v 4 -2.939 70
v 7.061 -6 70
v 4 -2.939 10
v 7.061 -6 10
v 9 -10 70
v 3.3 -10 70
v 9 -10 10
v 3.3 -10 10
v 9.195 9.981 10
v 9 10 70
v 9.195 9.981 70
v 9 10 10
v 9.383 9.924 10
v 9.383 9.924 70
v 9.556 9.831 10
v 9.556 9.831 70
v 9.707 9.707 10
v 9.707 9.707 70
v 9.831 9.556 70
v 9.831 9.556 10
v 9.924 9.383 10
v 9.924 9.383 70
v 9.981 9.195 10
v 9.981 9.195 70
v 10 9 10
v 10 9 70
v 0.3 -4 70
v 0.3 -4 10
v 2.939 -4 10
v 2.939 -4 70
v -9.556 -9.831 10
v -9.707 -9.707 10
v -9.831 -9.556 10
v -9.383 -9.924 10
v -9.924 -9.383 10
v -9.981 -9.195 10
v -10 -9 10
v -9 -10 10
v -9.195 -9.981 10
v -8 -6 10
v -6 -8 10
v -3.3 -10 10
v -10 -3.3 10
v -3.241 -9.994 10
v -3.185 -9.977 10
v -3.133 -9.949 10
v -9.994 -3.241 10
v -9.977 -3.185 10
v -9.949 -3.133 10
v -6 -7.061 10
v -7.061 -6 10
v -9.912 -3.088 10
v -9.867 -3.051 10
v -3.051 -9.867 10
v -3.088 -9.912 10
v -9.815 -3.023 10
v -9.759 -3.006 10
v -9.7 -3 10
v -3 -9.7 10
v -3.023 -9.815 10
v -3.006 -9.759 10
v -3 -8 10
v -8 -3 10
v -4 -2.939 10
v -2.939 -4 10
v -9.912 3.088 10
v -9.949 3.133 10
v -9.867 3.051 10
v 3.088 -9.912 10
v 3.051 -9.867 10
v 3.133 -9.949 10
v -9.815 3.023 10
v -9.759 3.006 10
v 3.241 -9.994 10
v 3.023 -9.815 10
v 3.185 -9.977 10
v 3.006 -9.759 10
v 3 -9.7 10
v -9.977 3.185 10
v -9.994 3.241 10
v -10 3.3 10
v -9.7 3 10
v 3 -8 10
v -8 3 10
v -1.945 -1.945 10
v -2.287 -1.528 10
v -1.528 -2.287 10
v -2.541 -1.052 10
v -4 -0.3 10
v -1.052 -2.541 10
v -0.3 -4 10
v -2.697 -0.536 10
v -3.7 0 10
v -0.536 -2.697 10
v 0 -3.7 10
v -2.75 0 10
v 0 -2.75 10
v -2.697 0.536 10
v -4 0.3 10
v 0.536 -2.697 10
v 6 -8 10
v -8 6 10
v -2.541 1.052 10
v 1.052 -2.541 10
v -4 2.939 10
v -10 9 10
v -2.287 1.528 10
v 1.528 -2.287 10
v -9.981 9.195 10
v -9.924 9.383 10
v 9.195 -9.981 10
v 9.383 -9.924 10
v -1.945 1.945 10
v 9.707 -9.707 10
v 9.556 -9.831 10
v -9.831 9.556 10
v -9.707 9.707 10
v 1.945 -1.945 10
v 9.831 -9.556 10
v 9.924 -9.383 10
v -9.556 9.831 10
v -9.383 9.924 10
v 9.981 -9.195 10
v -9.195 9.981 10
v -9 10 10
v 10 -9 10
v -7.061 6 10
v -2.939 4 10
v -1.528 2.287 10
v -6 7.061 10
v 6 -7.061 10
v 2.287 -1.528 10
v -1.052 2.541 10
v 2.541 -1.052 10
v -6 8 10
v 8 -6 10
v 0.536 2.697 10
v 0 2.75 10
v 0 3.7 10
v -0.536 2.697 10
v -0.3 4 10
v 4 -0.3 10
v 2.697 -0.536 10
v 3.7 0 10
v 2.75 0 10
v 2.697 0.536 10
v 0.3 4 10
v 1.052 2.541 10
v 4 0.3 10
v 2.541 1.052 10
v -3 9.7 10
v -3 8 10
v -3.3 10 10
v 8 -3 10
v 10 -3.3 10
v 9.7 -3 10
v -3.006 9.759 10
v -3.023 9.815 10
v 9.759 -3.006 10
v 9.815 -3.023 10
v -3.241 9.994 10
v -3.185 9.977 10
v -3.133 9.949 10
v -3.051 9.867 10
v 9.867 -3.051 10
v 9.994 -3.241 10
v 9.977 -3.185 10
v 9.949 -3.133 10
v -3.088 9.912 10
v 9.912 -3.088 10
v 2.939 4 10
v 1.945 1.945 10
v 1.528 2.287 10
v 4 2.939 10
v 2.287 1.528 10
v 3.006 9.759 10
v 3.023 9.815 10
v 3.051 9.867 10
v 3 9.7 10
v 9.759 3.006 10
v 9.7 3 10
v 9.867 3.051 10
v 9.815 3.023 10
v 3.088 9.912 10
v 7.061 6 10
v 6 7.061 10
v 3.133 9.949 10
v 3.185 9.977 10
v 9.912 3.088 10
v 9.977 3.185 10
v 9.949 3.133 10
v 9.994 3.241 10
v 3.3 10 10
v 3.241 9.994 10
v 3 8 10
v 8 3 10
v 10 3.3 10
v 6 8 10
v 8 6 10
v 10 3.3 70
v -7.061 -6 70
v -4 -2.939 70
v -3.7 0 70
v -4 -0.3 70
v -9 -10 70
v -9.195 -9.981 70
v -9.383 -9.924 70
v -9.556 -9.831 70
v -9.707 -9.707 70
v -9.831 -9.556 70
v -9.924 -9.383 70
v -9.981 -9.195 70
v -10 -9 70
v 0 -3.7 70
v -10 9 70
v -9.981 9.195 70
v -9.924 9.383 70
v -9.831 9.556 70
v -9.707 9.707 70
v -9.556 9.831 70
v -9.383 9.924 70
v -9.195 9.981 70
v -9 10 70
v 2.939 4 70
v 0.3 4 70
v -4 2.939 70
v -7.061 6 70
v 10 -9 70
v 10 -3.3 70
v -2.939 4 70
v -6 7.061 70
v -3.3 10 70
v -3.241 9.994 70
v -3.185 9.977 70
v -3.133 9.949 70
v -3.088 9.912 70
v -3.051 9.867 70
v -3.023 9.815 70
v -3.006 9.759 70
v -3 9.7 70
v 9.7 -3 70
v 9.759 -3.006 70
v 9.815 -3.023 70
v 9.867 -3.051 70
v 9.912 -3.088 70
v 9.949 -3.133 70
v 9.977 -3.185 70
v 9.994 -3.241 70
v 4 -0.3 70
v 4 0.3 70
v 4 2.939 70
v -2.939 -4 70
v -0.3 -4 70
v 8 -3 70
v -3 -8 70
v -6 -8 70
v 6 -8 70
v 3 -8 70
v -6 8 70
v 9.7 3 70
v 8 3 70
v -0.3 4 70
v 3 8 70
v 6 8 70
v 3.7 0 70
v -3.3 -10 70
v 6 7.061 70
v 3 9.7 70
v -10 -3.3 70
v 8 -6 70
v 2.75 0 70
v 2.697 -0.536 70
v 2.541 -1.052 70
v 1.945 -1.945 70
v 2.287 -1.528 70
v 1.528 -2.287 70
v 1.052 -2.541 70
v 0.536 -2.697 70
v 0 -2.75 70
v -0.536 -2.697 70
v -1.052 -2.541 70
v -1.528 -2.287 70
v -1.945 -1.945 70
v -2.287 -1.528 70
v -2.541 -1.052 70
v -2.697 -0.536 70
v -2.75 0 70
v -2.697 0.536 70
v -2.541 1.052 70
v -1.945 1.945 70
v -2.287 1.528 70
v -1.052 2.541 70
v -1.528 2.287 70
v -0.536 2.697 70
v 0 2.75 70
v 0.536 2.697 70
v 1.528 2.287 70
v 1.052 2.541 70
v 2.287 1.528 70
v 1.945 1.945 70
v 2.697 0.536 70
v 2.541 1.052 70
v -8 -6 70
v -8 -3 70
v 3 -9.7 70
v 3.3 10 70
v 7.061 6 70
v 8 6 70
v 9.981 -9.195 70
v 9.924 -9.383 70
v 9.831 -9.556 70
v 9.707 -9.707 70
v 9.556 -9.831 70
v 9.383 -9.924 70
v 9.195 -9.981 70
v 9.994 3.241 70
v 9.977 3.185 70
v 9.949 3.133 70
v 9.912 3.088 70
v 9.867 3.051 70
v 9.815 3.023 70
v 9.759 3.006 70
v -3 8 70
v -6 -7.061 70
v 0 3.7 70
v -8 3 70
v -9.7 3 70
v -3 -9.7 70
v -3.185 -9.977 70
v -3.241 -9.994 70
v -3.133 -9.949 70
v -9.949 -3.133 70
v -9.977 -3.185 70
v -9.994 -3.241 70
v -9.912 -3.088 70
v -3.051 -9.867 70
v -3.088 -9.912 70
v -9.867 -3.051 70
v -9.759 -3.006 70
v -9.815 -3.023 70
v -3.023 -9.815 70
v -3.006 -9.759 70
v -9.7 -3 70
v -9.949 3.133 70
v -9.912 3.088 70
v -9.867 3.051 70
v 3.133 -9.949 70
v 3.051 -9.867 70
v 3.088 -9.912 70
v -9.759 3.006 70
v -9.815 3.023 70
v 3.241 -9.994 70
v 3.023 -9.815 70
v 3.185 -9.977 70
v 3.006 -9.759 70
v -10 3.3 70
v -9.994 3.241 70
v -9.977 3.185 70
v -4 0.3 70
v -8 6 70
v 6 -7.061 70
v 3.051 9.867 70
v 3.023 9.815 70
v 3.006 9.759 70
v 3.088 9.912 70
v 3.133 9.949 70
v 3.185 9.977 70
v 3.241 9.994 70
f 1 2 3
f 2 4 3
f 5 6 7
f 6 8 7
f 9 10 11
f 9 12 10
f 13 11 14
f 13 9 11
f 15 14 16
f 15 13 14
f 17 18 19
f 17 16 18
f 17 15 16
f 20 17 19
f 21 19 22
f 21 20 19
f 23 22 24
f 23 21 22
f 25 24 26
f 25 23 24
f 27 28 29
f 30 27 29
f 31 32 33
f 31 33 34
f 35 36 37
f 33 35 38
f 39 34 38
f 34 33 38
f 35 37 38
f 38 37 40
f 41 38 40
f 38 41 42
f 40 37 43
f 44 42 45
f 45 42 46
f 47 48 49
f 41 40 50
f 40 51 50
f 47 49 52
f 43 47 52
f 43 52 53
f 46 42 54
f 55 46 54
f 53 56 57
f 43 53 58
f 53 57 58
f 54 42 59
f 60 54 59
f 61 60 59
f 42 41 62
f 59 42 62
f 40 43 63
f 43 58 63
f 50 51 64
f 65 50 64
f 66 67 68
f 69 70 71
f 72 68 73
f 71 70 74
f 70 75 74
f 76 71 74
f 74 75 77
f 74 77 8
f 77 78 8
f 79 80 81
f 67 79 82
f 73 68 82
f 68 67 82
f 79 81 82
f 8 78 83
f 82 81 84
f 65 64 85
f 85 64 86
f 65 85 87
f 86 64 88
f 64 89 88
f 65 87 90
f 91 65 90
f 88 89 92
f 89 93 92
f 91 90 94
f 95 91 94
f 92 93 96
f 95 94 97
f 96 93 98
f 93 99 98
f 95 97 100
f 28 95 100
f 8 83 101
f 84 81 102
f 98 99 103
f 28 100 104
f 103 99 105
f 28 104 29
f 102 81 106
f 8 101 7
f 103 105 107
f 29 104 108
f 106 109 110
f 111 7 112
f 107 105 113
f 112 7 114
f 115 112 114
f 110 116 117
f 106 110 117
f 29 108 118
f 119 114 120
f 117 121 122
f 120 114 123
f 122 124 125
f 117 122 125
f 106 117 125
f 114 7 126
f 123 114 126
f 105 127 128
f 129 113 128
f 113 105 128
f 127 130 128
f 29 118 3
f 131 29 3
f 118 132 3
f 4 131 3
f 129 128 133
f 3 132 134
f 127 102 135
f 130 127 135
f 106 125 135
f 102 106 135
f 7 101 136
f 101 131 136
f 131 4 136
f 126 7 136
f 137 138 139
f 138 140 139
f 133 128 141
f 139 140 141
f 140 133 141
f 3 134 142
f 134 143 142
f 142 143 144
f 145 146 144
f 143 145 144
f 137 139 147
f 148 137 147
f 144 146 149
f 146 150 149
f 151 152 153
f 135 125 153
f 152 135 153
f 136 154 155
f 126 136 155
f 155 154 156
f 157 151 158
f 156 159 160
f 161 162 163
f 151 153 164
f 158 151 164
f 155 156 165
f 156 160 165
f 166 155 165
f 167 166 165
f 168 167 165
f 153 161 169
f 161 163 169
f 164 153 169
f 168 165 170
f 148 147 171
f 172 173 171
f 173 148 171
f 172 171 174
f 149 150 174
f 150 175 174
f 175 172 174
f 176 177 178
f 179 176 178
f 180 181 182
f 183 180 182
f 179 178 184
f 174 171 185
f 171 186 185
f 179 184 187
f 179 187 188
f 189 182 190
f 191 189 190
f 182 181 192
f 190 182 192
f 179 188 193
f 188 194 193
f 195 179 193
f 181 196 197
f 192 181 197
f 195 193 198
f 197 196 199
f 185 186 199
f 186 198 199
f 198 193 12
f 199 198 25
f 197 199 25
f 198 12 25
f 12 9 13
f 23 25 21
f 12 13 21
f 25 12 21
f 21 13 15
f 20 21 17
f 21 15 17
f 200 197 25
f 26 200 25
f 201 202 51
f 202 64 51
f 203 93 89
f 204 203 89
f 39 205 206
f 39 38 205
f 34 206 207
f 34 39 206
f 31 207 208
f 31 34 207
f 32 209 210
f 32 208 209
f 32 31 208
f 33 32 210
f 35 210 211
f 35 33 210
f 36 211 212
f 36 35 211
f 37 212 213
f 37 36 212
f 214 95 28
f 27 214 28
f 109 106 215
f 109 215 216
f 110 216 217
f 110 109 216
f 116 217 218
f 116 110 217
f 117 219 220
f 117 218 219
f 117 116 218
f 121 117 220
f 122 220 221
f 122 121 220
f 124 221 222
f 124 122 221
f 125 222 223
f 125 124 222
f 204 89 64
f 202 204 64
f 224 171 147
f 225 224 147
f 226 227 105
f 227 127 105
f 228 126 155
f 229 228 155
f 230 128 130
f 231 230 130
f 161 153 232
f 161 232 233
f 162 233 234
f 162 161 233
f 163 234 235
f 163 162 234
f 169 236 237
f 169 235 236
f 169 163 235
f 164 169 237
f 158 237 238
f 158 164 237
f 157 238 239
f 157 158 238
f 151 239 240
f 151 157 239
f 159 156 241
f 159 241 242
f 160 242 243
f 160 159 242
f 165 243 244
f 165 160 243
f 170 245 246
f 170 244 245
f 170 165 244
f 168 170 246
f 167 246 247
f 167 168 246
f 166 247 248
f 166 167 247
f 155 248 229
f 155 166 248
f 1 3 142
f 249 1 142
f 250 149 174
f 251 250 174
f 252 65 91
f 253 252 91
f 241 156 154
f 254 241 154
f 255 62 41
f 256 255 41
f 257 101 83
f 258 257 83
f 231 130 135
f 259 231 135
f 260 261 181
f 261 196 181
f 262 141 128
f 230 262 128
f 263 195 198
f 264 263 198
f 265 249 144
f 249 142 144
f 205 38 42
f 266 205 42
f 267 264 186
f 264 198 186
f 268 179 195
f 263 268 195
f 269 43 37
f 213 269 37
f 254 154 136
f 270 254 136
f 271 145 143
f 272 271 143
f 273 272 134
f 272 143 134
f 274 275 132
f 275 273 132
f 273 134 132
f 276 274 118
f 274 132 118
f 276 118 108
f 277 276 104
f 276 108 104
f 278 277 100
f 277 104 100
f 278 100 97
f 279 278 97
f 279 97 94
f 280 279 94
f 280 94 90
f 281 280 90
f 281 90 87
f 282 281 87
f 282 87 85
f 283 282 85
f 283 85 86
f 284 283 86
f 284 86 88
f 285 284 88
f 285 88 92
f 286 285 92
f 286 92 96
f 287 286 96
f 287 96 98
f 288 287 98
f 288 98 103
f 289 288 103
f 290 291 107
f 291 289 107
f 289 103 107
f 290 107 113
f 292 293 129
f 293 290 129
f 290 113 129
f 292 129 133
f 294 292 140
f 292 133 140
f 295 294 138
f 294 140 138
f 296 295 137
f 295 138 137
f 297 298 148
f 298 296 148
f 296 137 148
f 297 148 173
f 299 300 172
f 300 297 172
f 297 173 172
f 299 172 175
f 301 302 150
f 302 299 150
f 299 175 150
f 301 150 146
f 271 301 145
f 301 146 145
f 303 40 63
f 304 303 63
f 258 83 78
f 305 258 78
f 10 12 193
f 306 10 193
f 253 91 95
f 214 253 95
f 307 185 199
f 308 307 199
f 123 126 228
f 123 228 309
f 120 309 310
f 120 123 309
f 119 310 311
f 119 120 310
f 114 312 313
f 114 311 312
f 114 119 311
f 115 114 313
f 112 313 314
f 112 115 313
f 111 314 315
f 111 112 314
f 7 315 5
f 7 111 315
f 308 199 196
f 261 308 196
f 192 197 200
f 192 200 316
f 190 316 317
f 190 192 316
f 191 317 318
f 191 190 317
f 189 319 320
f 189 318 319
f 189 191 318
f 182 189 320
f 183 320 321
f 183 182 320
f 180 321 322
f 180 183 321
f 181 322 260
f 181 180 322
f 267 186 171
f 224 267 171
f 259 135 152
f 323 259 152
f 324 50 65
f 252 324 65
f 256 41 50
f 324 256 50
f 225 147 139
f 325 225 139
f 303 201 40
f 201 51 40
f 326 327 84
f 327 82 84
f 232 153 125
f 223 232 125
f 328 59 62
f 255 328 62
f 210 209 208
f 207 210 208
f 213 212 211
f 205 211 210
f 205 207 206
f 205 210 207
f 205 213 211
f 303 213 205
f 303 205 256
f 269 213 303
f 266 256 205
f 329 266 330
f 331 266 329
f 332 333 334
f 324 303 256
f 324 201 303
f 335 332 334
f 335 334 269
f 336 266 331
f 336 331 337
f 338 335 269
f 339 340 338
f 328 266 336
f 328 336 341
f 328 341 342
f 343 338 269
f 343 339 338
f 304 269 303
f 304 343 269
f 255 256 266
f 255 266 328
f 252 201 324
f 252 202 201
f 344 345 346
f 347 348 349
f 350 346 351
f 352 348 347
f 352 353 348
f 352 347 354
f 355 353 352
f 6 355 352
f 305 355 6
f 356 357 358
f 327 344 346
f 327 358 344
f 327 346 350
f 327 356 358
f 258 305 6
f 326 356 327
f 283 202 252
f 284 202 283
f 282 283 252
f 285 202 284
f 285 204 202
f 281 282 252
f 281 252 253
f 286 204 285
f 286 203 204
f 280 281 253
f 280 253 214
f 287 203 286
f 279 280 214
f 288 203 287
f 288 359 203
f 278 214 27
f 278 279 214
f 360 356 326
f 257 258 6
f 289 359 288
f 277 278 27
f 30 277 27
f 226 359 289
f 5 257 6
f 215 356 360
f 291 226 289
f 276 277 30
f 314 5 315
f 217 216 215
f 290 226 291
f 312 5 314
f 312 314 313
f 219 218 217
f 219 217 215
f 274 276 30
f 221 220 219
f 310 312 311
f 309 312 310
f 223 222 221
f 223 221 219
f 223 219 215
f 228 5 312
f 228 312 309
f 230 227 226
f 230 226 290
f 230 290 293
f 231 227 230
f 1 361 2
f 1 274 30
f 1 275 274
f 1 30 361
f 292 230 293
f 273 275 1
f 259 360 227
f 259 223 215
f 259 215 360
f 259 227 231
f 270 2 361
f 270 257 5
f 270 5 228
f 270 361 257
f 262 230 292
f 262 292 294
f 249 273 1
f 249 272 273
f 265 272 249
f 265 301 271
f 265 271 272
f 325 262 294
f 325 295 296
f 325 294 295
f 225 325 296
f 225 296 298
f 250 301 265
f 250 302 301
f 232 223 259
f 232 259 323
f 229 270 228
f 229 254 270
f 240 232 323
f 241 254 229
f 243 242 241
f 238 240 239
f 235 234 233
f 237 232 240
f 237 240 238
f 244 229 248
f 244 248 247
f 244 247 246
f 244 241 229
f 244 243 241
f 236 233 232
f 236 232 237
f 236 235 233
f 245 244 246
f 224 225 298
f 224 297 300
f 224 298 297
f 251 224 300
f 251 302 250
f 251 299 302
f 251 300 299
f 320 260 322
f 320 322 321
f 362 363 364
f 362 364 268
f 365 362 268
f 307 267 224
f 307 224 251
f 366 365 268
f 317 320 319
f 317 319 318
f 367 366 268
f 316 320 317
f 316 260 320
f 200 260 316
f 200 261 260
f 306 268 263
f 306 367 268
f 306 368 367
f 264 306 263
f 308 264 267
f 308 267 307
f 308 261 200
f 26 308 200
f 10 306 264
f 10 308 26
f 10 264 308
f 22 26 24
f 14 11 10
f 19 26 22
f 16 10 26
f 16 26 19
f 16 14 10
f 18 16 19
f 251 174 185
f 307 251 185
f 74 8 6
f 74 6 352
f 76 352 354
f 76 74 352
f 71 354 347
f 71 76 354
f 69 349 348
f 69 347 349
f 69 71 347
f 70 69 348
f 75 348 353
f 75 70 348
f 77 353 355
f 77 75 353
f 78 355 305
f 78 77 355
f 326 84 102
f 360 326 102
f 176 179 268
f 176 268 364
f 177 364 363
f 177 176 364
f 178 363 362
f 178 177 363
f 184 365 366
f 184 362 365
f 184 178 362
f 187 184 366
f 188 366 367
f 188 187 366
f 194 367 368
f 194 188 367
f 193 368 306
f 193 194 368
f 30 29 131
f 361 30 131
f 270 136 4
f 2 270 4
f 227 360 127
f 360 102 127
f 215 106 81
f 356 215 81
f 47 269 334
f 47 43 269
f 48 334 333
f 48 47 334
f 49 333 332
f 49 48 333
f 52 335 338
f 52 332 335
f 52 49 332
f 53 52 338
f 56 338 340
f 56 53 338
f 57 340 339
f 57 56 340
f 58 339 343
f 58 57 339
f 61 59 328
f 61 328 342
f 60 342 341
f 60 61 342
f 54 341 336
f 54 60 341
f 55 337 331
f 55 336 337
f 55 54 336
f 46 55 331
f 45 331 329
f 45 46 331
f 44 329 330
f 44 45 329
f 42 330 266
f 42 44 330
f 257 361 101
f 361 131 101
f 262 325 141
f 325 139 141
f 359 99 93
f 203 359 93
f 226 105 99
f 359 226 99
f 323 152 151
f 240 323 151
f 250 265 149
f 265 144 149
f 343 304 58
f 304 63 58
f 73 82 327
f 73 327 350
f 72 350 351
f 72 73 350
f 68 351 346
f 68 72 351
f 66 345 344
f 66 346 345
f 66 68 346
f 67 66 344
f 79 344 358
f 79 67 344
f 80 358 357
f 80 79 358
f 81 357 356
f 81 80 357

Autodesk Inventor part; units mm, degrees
ref_plane "Startebene" through (0, 0, 0) normal (0, 0, 1) x (1, 0, 0)
ref_plane "Endebene" through (0, 0, 320) normal (0, 0, 1) x (1, 0, 0)
ref_plane "Startebene1" through (0, 0, 0) normal (0, 0, 1) x (1, 0, 0)
ref_plane "Endebene1" through (0, 0, 80) normal (0, 0, 1) x (1, 0, 0)
ref_plane "Startebene2" through (0, 0, 10) normal (0, 0, 1) x (1, 0, 0)
ref_plane "Endebene2" through (0, 0, 70) normal (0, 0, 1) x (1, 0, 0)
sketch "Skizze" plane through (0, 0, 0) normal (0, 0, 1) x (1, 0, 0)
  line L0 (-10, 9) -> (-10, 3.3)
  arc A0 (-10, 3.3) -> (-9.7, 3) centre (-9.7, 3.3) ccw
  line L1 (-9.7, 3) -> (-8, 3)
  line L2 (-8, 3) -> (-8, 6)
  line L3 (-8, 6) -> (-7.0607, 6)
  line L4 (-7.0607, 6) -> (-4, 2.9393)
  line L5 (-4, 2.9393) -> (-4, 0.3)
  line L6 (-4, 0.3) -> (-3.7, 0)
  line L7 (-3.7, 0) -> (-4, -0.3)
  line L8 (-4, -0.3) -> (-4, -2.9393)
  line L9 (-4, -2.9393) -> (-7.0607, -6)
  line L10 (-7.0607, -6) -> (-8, -6)
  line L11 (-8, -6) -> (-8, -3)
  line L12 (-8, -3) -> (-9.7, -3)
  arc A1 (-9.7, -3) -> (-10, -3.3) centre (-9.7, -3.3) ccw
  line L13 (-10, -3.3) -> (-10, -9)
  arc A2 (-10, -9) -> (-9, -10) centre (-9, -9) ccw
  line L14 (-9, -10) -> (-3.3, -10)
  arc A3 (-3.3, -10) -> (-3, -9.7) centre (-3.3, -9.7) ccw
  line L15 (-3, -9.7) -> (-3, -8)
  line L16 (-3, -8) -> (-6, -8)
  line L17 (-6, -8) -> (-6, -7.0607)
  line L18 (-6, -7.0607) -> (-2.9393, -4)
  line L19 (-2.9393, -4) -> (-0.3, -4)
  line L20 (-0.3, -4) -> (0, -3.7)
  line L21 (0, -3.7) -> (0.3, -4)
  line L22 (0.3, -4) -> (2.9393, -4)
  line L23 (2.9393, -4) -> (6, -7.0607)
  line L24 (6, -7.0607) -> (6, -8)
  line L25 (6, -8) -> (3, -8)
  line L26 (3, -8) -> (3, -9.7)
  arc A4 (3, -9.7) -> (3.3, -10) centre (3.3, -9.7) ccw
  line L27 (3.3, -10) -> (9, -10)
  arc A5 (9, -10) -> (10, -9) centre (9, -9) ccw
  line L28 (10, -9) -> (10, -3.3)
  arc A6 (10, -3.3) -> (9.7, -3) centre (9.7, -3.3) ccw
  line L29 (9.7, -3) -> (8, -3)
  line L30 (8, -3) -> (8, -6)
  line L31 (8, -6) -> (7.0607, -6)
  line L32 (7.0607, -6) -> (4, -2.9393)
  line L33 (4, -2.9393) -> (4, -0.3)
  line L34 (4, -0.3) -> (3.7, 0)
  line L35 (3.7, 0) -> (4, 0.3)
  line L36 (4, 0.3) -> (4, 2.9393)
  line L37 (4, 2.9393) -> (7.0607, 6)
  line L38 (7.0607, 6) -> (8, 6)
  line L39 (8, 6) -> (8, 3)
  line L40 (8, 3) -> (9.7, 3)
  arc A7 (9.7, 3) -> (10, 3.3) centre (9.7, 3.3) ccw
  line L41 (10, 3.3) -> (10, 9)
  arc A8 (10, 9) -> (9, 10) centre (9, 9) ccw
  line L42 (9, 10) -> (3.3, 10)
  arc A9 (3.3, 10) -> (3, 9.7) centre (3.3, 9.7) ccw
  line L43 (3, 9.7) -> (3, 8)
  line L44 (3, 8) -> (6, 8)
  line L45 (6, 8) -> (6, 7.0607)
  line L46 (6, 7.0607) -> (2.9393, 4)
  line L47 (2.9393, 4) -> (0.3, 4)
  line L48 (0.3, 4) -> (0, 3.7)
  line L49 (0, 3.7) -> (-0.3, 4)
  line L50 (-0.3, 4) -> (-2.9393, 4)
  line L51 (-2.9393, 4) -> (-6, 7.0607)
  line L52 (-6, 7.0607) -> (-6, 8)
  line L53 (-6, 8) -> (-3, 8)
  line L54 (-3, 8) -> (-3, 9.7)
  arc A10 (-3, 9.7) -> (-3.3, 10) centre (-3.3, 9.7) ccw
  line L55 (-3.3, 10) -> (-9, 10)
  arc A11 (-9, 10) -> (-10, 9) centre (-9, 9) ccw
  circle A12 centre (0, 0) radius 2.75
  dimension "d2" = 5.5
  dimension "d3" = 10
  dimension "d4" = 10
  dimension "d5" = 5.7
  dimension "d6" = 5.7
  dimension "d7" = 1.7
  dimension "d8" = 3
  dimension "d9" = 0.3
  dimension "d10" = 90
  dimension "d11" = 45
  dimension "d12" = 45
  dimension "d13" = 45
  dimension "d14" = 90
  dimension "d15" = 90
  dimension "d16" = 45
  dimension "d17" = 45
  dimension "d18" = 45
  dimension "d19" = 45
  dimension "d20" = 90
  dimension "d21" = 90
  dimension "d22" = 45
  dimension "d23" = 45
  dimension "d24" = 90
  dimension "d25" = 90
  dimension "d26" = 90
  dimension "d27" = 90
  dimension "d28" = 90
  dimension "d29" = 90
  dimension "d30" = 90
  dimension "d31" = 90
  dimension "d32" = 90
  dimension "d33" = 90
  dimension "d34" = 90
  dimension "d35" = 90
  dimension "d36" = 90
  dimension "d37" = 90
  dimension "d38" = 90
  dimension "d39" = 4
  dimension "d40" = 6
  dimension "d41" = 13
  dimension "d42" = 14
  dimension "d43" = 16
  dimension "d44" = 18
  dimension "d45" = 3
  dimension "d46" = 9
  dimension "d47" = 7
  dimension "d48" = 1
  dimension "d49" = 7
  dimension "d50" = 1.5
  dimension "d51" = 1.8663
  dimension "d52" = 3.3663
  dimension "d53" = 1.5
  dimension "d54" = 1.8663
  dimension "d55" = 3.3663
  dimension "d56" = 4
  dimension "d57" = 10.8187
  dimension "d58" = 1.9092
  dimension "d59" = 5
  dimension "d60" = 13
  dimension "d61" = 13
  dimension "d62" = 16.0513
  dimension "d63" = 3.3234
  dimension "d64" = 14
  dimension "d65" = 12.685
extrude "Körper" add sketch "Skizze" along normal up to surface (60 mm away) from surface at 10
sketch "Skizze13" plane through (0, 0, 0) normal (0, 0, 1) x (1, 0, 0)
  line L0 (0, 0) -> (10, 0)
ref_plane "Arbeitsebene12" through (0, 0, 0) normal (0, -1, 0) x (1, 0, 0)
sketch "Skizze14" plane through (0, 0, 0) normal (0, -1, 0) x (1, 0, 0)
  line L0 (-2, 10) -> (12, 10)
  line L1 (-2, 70) -> (12, 70)
  dimension "d80" = 60
ref_plane "Arbeitsebene13" through (9, -80, 70) normal (0, 0, 1) x (1, 0, 0)
split "Trennen1" plane through (9, -80, 70) removes the side toward (0, 0, 1)
ref_plane "Arbeitsebene14" through (3.3, -80, 10) normal (0, 0, -1) x (-1, 0, 0)
split "Trennen2" plane through (3.3, -80, 10) removes the side toward (0, 0, -1)
equation "\"G_OFFSET_START\" = 0"
equation "\"G_OFFSET_END\" = 0"
equation "\"G_L\" = d80"
equation "\"G_OFFSET_START1\" = 0"
equation "\"G_OFFSET_END1\" = 0"
properties part number "Alu Profil 20x20 - AP2020" material "Aluminium 6061"
